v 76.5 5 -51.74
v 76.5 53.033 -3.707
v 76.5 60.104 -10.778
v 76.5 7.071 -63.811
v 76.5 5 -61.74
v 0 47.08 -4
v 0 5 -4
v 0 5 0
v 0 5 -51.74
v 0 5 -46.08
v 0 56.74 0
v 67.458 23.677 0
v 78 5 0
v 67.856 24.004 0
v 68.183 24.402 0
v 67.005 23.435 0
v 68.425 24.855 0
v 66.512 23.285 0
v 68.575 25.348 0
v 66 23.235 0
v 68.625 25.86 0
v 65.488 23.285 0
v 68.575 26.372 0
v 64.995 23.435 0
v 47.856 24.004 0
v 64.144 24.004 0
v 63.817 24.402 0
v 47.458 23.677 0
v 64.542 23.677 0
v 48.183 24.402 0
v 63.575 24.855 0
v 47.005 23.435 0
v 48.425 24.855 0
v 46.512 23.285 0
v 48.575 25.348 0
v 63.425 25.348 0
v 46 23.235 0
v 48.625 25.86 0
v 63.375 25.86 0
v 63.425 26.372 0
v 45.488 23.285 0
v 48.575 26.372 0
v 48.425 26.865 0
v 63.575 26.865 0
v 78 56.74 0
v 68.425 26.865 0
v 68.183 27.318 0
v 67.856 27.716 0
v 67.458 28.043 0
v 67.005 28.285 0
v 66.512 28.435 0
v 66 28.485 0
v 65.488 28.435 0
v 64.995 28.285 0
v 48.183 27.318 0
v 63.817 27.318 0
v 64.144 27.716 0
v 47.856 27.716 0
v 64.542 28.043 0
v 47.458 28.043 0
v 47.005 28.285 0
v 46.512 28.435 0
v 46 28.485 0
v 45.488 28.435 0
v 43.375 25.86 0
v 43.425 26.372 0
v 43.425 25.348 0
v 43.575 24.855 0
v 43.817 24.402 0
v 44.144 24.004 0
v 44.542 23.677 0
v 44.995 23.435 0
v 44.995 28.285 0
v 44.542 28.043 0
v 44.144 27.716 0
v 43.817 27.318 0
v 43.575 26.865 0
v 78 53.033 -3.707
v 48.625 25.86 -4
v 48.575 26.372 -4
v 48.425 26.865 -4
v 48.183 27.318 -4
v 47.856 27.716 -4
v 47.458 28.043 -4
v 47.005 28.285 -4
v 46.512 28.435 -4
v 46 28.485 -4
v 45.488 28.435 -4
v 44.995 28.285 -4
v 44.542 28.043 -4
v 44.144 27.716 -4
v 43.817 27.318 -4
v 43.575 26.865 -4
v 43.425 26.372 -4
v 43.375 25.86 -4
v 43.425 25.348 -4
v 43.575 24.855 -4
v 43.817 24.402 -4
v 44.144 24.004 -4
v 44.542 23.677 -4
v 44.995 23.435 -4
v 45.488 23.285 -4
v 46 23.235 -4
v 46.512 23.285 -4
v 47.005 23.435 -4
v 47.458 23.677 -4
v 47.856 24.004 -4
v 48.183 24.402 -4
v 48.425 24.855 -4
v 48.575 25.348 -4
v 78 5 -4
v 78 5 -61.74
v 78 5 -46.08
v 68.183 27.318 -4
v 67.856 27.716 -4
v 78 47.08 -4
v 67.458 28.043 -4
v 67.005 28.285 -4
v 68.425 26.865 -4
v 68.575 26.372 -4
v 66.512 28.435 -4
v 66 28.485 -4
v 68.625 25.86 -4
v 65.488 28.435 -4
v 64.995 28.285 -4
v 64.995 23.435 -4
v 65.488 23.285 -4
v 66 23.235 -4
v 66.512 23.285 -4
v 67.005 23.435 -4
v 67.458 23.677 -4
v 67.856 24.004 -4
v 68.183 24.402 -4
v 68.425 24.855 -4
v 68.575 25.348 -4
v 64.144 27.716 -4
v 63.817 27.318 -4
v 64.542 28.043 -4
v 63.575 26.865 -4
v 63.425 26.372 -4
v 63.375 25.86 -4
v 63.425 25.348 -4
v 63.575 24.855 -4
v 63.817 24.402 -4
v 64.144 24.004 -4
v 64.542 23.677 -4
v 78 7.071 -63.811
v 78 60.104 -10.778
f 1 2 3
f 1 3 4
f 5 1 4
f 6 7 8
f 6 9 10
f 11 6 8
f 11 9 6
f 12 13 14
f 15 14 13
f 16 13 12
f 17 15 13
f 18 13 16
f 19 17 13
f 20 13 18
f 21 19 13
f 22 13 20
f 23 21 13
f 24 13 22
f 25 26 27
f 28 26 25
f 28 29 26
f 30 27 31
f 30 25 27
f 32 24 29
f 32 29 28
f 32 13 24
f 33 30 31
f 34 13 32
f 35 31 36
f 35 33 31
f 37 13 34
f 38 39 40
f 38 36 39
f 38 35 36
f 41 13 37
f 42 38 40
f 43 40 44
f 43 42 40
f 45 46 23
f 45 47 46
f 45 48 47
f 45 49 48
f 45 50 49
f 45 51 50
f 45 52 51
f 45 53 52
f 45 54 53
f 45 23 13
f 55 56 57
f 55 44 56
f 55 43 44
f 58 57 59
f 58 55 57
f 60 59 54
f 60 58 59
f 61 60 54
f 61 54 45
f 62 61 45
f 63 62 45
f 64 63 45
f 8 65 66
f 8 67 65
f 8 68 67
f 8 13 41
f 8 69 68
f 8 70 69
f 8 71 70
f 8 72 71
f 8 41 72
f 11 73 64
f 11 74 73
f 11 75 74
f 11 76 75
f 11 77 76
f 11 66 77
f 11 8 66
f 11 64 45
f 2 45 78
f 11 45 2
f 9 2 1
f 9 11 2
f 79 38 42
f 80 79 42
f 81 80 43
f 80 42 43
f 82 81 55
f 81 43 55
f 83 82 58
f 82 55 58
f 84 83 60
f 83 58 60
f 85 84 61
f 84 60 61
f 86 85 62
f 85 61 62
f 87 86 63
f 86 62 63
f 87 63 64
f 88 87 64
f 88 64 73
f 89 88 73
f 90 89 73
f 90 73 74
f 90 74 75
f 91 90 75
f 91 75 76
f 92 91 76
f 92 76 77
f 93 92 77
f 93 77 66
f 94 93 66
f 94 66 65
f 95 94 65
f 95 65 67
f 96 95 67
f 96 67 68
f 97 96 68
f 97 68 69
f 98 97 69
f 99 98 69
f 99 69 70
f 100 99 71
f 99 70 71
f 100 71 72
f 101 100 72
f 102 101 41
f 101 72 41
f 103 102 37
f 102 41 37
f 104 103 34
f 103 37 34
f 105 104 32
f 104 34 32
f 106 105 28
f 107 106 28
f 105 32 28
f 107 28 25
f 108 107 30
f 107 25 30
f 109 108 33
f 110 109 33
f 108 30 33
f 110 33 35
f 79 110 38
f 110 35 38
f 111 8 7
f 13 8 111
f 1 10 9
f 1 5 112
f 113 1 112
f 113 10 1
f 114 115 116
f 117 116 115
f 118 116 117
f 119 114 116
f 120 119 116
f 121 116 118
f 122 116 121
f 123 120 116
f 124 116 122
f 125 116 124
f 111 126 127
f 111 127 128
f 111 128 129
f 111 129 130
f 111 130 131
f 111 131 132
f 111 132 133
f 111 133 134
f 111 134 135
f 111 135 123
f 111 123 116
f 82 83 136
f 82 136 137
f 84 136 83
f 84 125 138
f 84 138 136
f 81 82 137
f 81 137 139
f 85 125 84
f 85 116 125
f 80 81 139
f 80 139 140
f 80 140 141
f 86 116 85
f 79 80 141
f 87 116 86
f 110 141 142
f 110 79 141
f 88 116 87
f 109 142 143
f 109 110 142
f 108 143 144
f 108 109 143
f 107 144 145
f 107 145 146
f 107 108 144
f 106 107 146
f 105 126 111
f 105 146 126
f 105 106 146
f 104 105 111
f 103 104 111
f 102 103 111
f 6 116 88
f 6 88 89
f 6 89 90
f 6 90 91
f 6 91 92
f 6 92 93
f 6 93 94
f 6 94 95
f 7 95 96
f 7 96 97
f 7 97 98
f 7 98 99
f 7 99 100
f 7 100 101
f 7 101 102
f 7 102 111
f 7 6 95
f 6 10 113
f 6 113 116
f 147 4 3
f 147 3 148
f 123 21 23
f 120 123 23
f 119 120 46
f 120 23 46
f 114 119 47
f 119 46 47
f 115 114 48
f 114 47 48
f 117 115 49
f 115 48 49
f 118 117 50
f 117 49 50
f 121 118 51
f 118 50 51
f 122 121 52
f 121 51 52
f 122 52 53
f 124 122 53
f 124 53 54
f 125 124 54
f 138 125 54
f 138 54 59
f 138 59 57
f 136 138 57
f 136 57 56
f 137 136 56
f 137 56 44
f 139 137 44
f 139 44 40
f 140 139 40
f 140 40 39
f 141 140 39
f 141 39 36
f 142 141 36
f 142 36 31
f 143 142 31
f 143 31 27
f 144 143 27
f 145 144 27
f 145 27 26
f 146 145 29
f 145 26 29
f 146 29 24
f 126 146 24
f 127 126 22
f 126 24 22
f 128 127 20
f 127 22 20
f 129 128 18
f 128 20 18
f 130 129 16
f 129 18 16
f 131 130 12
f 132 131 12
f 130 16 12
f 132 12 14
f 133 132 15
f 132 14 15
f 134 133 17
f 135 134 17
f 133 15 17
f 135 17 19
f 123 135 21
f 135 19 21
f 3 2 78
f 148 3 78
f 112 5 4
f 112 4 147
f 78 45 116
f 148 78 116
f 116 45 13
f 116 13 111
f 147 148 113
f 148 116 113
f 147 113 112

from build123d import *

# Parameters (mm, degrees)
BOSS_EXTRUDE1_DEPTH = 78
SKETCH2_W           = 1.5
SKETCH2_H           = 75
BOSS_EXTRUDE2_DEPTH = 10
CUT_EXTRUDE1_REACH  = 119.339
SKETCH3_R           = 2.625
SKETCH4_W           = 78
SKETCH4_H           = 5
CUT_EXTRUDE2_DEPTH  = 118.338622692


with BuildPart() as part:
    # Sketch1 → Boss-Extrude1 (new body)
    with BuildSketch(Plane(origin=(0, 0, 0), x_dir=(0, 0, -1), z_dir=(1, 0, 0))):
        Polygon((0, 0), (0, 56.74), (56.74, 0), (51.08, 0), (4, 47.08), (4, 0), align=None)
    extrude(amount=BOSS_EXTRUDE1_DEPTH)

    # Sketch2 → Boss-Extrude2 (add)
    with BuildSketch(Plane(origin=(0, 28.37, -28.37), x_dir=(1, 0, 0), z_dir=(0, 0.7071067811865482, -0.7071067811865468))):
        with Locations((77.25, 2.621238765)):
            Rectangle(SKETCH2_W, SKETCH2_H)
    extrude(amount=BOSS_EXTRUDE2_DEPTH)

    # Sketch3 → Cut-Extrude1 (cut, up to next)
    with BuildSketch(Plane.XY, mode=Mode.PRIVATE) as cut_extrude1_sk1:
        with Locations((66, 25.86)):
            Circle(SKETCH3_R)
    cut_extrude1_tool1 = extrude(cut_extrude1_sk1.sketch, amount=-CUT_EXTRUDE1_REACH, mode=Mode.PRIVATE) & part.part
    # Sketch3 → Cut-Extrude1 (cut, up to next)
    with BuildSketch(Plane.XY, mode=Mode.PRIVATE) as cut_extrude1_sk2:
        with Locations((46, 25.86)):
            Circle(SKETCH3_R)
    cut_extrude1_tool2 = extrude(cut_extrude1_sk2.sketch, amount=-CUT_EXTRUDE1_REACH, mode=Mode.PRIVATE) & part.part
    add(cut_extrude1_tool1.solids().sort_by_distance((66, 25.86, 0))[0], mode=Mode.SUBTRACT)
    add(cut_extrude1_tool2.solids().sort_by_distance((46, 25.86, 0))[0], mode=Mode.SUBTRACT)

    # Sketch4 → Cut-Extrude2 (cut, through all)
    with BuildSketch(Plane.XY):
        with Locations((39, 2.5)):
            Rectangle(SKETCH4_W, SKETCH4_H)
    extrude(amount=-CUT_EXTRUDE2_DEPTH, mode=Mode.SUBTRACT)


solid = part.part
